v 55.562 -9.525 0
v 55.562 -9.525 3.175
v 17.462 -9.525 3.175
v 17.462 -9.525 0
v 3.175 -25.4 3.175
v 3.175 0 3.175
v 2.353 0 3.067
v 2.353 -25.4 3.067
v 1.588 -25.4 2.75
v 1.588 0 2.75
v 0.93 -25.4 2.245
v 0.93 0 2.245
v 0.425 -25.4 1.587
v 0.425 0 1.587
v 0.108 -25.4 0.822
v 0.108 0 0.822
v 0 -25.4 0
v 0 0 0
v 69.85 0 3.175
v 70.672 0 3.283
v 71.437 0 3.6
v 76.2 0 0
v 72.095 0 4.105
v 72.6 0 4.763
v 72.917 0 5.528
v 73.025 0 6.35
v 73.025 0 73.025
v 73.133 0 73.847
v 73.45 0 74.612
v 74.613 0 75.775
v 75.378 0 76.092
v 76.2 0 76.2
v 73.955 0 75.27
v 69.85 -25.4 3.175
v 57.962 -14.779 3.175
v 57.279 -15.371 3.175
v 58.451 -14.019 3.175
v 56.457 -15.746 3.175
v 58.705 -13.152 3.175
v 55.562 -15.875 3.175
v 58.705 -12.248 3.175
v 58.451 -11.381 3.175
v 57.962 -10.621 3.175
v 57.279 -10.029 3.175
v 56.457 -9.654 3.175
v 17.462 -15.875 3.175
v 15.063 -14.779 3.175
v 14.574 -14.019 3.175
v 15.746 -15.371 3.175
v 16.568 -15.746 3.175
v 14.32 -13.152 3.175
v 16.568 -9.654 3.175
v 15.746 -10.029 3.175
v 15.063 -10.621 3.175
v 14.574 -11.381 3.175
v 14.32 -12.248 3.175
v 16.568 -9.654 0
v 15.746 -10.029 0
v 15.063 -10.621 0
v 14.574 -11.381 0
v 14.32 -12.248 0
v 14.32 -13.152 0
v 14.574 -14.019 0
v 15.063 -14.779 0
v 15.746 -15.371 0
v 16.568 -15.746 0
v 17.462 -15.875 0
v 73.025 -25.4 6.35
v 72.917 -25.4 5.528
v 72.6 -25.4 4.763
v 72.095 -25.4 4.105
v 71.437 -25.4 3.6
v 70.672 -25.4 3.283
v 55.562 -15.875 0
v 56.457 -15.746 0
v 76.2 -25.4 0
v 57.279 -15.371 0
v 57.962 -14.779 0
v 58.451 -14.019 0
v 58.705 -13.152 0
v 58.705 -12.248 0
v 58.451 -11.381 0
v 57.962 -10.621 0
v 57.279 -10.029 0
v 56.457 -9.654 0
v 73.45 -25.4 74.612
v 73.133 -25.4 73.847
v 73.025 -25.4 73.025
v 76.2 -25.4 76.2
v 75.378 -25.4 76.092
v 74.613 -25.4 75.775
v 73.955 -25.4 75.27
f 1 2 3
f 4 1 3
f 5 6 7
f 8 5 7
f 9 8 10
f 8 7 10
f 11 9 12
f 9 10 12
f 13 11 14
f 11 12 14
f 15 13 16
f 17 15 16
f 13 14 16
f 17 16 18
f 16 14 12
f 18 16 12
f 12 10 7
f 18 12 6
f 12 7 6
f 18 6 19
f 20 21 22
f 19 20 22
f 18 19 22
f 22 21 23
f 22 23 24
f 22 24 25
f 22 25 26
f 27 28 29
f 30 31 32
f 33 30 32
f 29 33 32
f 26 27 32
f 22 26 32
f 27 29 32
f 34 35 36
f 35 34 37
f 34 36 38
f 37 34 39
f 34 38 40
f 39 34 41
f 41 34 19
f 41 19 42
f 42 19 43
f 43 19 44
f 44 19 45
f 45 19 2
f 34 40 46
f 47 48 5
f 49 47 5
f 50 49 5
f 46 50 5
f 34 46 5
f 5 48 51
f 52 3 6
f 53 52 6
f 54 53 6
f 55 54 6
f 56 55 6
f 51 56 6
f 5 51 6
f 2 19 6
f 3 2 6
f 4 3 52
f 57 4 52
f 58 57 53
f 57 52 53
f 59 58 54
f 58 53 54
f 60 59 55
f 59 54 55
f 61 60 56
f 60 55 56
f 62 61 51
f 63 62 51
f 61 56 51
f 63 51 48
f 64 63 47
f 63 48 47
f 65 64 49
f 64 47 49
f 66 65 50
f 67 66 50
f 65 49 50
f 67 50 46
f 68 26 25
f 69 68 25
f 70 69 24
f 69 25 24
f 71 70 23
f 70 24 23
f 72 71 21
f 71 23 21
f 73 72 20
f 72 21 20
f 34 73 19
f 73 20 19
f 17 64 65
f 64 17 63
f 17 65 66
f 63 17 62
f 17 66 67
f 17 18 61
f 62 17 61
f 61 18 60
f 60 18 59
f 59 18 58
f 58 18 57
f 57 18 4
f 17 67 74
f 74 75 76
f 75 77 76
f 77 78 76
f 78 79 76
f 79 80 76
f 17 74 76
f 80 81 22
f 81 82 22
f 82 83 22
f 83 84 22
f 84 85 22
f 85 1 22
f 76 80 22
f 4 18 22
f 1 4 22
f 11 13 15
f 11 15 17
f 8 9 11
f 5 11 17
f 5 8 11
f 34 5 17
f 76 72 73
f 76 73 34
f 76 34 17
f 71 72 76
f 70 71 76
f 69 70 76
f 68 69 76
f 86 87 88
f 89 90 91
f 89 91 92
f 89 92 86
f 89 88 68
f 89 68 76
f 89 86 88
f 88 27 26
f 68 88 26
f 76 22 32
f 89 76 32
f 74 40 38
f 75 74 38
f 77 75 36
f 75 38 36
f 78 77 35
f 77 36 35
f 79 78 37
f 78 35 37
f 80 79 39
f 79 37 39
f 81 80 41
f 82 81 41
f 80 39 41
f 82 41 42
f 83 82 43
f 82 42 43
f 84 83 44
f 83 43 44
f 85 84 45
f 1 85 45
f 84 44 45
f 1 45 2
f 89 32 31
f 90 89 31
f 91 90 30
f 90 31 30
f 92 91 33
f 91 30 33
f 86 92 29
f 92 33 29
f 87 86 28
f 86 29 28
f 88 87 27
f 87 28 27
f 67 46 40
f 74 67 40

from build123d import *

# Parameters (mm, degrees)
F1_DEPTH = 25.4
F3_DEPTH = 3.176


with BuildPart() as f1:
    # F0 (on Front) → F1 (new body)
    with BuildSketch(Plane.XZ):
        with BuildLine():
            ThreePointArc((3.175, 3.175), (0.929936, 2.245064), (0, 0))
            Line((0, 0), (76.2, 0))
            Line((76.2, 0), (76.2, 76.2))
            ThreePointArc((76.2, 76.2), (73.954936, 75.270064), (73.025, 73.025))
            Line((73.025, 73.025), (73.025, 6.35))
            ThreePointArc((73.025, 6.35), (72.095064, 4.104936), (69.85, 3.175))
            Line((69.85, 3.175), (3.175, 3.175))
        make_face()
    extrude(amount=F1_DEPTH)

    # F2 (on face) → F3 (cut, through all)
    with BuildSketch(Plane.XY.offset(3.175)):
        with BuildLine():
            Line((55.5625, -9.525), (17.4625, -9.525))
            ThreePointArc((17.4625, -9.525), (14.2875, -12.7), (17.4625, -15.875))
            Line((17.4625, -15.875), (55.5625, -15.875))
            ThreePointArc((55.5625, -15.875), (58.7375, -12.7), (55.5625, -9.525))
        make_face()
    extrude(amount=-F3_DEPTH, mode=Mode.SUBTRACT)


solid = f1.part
